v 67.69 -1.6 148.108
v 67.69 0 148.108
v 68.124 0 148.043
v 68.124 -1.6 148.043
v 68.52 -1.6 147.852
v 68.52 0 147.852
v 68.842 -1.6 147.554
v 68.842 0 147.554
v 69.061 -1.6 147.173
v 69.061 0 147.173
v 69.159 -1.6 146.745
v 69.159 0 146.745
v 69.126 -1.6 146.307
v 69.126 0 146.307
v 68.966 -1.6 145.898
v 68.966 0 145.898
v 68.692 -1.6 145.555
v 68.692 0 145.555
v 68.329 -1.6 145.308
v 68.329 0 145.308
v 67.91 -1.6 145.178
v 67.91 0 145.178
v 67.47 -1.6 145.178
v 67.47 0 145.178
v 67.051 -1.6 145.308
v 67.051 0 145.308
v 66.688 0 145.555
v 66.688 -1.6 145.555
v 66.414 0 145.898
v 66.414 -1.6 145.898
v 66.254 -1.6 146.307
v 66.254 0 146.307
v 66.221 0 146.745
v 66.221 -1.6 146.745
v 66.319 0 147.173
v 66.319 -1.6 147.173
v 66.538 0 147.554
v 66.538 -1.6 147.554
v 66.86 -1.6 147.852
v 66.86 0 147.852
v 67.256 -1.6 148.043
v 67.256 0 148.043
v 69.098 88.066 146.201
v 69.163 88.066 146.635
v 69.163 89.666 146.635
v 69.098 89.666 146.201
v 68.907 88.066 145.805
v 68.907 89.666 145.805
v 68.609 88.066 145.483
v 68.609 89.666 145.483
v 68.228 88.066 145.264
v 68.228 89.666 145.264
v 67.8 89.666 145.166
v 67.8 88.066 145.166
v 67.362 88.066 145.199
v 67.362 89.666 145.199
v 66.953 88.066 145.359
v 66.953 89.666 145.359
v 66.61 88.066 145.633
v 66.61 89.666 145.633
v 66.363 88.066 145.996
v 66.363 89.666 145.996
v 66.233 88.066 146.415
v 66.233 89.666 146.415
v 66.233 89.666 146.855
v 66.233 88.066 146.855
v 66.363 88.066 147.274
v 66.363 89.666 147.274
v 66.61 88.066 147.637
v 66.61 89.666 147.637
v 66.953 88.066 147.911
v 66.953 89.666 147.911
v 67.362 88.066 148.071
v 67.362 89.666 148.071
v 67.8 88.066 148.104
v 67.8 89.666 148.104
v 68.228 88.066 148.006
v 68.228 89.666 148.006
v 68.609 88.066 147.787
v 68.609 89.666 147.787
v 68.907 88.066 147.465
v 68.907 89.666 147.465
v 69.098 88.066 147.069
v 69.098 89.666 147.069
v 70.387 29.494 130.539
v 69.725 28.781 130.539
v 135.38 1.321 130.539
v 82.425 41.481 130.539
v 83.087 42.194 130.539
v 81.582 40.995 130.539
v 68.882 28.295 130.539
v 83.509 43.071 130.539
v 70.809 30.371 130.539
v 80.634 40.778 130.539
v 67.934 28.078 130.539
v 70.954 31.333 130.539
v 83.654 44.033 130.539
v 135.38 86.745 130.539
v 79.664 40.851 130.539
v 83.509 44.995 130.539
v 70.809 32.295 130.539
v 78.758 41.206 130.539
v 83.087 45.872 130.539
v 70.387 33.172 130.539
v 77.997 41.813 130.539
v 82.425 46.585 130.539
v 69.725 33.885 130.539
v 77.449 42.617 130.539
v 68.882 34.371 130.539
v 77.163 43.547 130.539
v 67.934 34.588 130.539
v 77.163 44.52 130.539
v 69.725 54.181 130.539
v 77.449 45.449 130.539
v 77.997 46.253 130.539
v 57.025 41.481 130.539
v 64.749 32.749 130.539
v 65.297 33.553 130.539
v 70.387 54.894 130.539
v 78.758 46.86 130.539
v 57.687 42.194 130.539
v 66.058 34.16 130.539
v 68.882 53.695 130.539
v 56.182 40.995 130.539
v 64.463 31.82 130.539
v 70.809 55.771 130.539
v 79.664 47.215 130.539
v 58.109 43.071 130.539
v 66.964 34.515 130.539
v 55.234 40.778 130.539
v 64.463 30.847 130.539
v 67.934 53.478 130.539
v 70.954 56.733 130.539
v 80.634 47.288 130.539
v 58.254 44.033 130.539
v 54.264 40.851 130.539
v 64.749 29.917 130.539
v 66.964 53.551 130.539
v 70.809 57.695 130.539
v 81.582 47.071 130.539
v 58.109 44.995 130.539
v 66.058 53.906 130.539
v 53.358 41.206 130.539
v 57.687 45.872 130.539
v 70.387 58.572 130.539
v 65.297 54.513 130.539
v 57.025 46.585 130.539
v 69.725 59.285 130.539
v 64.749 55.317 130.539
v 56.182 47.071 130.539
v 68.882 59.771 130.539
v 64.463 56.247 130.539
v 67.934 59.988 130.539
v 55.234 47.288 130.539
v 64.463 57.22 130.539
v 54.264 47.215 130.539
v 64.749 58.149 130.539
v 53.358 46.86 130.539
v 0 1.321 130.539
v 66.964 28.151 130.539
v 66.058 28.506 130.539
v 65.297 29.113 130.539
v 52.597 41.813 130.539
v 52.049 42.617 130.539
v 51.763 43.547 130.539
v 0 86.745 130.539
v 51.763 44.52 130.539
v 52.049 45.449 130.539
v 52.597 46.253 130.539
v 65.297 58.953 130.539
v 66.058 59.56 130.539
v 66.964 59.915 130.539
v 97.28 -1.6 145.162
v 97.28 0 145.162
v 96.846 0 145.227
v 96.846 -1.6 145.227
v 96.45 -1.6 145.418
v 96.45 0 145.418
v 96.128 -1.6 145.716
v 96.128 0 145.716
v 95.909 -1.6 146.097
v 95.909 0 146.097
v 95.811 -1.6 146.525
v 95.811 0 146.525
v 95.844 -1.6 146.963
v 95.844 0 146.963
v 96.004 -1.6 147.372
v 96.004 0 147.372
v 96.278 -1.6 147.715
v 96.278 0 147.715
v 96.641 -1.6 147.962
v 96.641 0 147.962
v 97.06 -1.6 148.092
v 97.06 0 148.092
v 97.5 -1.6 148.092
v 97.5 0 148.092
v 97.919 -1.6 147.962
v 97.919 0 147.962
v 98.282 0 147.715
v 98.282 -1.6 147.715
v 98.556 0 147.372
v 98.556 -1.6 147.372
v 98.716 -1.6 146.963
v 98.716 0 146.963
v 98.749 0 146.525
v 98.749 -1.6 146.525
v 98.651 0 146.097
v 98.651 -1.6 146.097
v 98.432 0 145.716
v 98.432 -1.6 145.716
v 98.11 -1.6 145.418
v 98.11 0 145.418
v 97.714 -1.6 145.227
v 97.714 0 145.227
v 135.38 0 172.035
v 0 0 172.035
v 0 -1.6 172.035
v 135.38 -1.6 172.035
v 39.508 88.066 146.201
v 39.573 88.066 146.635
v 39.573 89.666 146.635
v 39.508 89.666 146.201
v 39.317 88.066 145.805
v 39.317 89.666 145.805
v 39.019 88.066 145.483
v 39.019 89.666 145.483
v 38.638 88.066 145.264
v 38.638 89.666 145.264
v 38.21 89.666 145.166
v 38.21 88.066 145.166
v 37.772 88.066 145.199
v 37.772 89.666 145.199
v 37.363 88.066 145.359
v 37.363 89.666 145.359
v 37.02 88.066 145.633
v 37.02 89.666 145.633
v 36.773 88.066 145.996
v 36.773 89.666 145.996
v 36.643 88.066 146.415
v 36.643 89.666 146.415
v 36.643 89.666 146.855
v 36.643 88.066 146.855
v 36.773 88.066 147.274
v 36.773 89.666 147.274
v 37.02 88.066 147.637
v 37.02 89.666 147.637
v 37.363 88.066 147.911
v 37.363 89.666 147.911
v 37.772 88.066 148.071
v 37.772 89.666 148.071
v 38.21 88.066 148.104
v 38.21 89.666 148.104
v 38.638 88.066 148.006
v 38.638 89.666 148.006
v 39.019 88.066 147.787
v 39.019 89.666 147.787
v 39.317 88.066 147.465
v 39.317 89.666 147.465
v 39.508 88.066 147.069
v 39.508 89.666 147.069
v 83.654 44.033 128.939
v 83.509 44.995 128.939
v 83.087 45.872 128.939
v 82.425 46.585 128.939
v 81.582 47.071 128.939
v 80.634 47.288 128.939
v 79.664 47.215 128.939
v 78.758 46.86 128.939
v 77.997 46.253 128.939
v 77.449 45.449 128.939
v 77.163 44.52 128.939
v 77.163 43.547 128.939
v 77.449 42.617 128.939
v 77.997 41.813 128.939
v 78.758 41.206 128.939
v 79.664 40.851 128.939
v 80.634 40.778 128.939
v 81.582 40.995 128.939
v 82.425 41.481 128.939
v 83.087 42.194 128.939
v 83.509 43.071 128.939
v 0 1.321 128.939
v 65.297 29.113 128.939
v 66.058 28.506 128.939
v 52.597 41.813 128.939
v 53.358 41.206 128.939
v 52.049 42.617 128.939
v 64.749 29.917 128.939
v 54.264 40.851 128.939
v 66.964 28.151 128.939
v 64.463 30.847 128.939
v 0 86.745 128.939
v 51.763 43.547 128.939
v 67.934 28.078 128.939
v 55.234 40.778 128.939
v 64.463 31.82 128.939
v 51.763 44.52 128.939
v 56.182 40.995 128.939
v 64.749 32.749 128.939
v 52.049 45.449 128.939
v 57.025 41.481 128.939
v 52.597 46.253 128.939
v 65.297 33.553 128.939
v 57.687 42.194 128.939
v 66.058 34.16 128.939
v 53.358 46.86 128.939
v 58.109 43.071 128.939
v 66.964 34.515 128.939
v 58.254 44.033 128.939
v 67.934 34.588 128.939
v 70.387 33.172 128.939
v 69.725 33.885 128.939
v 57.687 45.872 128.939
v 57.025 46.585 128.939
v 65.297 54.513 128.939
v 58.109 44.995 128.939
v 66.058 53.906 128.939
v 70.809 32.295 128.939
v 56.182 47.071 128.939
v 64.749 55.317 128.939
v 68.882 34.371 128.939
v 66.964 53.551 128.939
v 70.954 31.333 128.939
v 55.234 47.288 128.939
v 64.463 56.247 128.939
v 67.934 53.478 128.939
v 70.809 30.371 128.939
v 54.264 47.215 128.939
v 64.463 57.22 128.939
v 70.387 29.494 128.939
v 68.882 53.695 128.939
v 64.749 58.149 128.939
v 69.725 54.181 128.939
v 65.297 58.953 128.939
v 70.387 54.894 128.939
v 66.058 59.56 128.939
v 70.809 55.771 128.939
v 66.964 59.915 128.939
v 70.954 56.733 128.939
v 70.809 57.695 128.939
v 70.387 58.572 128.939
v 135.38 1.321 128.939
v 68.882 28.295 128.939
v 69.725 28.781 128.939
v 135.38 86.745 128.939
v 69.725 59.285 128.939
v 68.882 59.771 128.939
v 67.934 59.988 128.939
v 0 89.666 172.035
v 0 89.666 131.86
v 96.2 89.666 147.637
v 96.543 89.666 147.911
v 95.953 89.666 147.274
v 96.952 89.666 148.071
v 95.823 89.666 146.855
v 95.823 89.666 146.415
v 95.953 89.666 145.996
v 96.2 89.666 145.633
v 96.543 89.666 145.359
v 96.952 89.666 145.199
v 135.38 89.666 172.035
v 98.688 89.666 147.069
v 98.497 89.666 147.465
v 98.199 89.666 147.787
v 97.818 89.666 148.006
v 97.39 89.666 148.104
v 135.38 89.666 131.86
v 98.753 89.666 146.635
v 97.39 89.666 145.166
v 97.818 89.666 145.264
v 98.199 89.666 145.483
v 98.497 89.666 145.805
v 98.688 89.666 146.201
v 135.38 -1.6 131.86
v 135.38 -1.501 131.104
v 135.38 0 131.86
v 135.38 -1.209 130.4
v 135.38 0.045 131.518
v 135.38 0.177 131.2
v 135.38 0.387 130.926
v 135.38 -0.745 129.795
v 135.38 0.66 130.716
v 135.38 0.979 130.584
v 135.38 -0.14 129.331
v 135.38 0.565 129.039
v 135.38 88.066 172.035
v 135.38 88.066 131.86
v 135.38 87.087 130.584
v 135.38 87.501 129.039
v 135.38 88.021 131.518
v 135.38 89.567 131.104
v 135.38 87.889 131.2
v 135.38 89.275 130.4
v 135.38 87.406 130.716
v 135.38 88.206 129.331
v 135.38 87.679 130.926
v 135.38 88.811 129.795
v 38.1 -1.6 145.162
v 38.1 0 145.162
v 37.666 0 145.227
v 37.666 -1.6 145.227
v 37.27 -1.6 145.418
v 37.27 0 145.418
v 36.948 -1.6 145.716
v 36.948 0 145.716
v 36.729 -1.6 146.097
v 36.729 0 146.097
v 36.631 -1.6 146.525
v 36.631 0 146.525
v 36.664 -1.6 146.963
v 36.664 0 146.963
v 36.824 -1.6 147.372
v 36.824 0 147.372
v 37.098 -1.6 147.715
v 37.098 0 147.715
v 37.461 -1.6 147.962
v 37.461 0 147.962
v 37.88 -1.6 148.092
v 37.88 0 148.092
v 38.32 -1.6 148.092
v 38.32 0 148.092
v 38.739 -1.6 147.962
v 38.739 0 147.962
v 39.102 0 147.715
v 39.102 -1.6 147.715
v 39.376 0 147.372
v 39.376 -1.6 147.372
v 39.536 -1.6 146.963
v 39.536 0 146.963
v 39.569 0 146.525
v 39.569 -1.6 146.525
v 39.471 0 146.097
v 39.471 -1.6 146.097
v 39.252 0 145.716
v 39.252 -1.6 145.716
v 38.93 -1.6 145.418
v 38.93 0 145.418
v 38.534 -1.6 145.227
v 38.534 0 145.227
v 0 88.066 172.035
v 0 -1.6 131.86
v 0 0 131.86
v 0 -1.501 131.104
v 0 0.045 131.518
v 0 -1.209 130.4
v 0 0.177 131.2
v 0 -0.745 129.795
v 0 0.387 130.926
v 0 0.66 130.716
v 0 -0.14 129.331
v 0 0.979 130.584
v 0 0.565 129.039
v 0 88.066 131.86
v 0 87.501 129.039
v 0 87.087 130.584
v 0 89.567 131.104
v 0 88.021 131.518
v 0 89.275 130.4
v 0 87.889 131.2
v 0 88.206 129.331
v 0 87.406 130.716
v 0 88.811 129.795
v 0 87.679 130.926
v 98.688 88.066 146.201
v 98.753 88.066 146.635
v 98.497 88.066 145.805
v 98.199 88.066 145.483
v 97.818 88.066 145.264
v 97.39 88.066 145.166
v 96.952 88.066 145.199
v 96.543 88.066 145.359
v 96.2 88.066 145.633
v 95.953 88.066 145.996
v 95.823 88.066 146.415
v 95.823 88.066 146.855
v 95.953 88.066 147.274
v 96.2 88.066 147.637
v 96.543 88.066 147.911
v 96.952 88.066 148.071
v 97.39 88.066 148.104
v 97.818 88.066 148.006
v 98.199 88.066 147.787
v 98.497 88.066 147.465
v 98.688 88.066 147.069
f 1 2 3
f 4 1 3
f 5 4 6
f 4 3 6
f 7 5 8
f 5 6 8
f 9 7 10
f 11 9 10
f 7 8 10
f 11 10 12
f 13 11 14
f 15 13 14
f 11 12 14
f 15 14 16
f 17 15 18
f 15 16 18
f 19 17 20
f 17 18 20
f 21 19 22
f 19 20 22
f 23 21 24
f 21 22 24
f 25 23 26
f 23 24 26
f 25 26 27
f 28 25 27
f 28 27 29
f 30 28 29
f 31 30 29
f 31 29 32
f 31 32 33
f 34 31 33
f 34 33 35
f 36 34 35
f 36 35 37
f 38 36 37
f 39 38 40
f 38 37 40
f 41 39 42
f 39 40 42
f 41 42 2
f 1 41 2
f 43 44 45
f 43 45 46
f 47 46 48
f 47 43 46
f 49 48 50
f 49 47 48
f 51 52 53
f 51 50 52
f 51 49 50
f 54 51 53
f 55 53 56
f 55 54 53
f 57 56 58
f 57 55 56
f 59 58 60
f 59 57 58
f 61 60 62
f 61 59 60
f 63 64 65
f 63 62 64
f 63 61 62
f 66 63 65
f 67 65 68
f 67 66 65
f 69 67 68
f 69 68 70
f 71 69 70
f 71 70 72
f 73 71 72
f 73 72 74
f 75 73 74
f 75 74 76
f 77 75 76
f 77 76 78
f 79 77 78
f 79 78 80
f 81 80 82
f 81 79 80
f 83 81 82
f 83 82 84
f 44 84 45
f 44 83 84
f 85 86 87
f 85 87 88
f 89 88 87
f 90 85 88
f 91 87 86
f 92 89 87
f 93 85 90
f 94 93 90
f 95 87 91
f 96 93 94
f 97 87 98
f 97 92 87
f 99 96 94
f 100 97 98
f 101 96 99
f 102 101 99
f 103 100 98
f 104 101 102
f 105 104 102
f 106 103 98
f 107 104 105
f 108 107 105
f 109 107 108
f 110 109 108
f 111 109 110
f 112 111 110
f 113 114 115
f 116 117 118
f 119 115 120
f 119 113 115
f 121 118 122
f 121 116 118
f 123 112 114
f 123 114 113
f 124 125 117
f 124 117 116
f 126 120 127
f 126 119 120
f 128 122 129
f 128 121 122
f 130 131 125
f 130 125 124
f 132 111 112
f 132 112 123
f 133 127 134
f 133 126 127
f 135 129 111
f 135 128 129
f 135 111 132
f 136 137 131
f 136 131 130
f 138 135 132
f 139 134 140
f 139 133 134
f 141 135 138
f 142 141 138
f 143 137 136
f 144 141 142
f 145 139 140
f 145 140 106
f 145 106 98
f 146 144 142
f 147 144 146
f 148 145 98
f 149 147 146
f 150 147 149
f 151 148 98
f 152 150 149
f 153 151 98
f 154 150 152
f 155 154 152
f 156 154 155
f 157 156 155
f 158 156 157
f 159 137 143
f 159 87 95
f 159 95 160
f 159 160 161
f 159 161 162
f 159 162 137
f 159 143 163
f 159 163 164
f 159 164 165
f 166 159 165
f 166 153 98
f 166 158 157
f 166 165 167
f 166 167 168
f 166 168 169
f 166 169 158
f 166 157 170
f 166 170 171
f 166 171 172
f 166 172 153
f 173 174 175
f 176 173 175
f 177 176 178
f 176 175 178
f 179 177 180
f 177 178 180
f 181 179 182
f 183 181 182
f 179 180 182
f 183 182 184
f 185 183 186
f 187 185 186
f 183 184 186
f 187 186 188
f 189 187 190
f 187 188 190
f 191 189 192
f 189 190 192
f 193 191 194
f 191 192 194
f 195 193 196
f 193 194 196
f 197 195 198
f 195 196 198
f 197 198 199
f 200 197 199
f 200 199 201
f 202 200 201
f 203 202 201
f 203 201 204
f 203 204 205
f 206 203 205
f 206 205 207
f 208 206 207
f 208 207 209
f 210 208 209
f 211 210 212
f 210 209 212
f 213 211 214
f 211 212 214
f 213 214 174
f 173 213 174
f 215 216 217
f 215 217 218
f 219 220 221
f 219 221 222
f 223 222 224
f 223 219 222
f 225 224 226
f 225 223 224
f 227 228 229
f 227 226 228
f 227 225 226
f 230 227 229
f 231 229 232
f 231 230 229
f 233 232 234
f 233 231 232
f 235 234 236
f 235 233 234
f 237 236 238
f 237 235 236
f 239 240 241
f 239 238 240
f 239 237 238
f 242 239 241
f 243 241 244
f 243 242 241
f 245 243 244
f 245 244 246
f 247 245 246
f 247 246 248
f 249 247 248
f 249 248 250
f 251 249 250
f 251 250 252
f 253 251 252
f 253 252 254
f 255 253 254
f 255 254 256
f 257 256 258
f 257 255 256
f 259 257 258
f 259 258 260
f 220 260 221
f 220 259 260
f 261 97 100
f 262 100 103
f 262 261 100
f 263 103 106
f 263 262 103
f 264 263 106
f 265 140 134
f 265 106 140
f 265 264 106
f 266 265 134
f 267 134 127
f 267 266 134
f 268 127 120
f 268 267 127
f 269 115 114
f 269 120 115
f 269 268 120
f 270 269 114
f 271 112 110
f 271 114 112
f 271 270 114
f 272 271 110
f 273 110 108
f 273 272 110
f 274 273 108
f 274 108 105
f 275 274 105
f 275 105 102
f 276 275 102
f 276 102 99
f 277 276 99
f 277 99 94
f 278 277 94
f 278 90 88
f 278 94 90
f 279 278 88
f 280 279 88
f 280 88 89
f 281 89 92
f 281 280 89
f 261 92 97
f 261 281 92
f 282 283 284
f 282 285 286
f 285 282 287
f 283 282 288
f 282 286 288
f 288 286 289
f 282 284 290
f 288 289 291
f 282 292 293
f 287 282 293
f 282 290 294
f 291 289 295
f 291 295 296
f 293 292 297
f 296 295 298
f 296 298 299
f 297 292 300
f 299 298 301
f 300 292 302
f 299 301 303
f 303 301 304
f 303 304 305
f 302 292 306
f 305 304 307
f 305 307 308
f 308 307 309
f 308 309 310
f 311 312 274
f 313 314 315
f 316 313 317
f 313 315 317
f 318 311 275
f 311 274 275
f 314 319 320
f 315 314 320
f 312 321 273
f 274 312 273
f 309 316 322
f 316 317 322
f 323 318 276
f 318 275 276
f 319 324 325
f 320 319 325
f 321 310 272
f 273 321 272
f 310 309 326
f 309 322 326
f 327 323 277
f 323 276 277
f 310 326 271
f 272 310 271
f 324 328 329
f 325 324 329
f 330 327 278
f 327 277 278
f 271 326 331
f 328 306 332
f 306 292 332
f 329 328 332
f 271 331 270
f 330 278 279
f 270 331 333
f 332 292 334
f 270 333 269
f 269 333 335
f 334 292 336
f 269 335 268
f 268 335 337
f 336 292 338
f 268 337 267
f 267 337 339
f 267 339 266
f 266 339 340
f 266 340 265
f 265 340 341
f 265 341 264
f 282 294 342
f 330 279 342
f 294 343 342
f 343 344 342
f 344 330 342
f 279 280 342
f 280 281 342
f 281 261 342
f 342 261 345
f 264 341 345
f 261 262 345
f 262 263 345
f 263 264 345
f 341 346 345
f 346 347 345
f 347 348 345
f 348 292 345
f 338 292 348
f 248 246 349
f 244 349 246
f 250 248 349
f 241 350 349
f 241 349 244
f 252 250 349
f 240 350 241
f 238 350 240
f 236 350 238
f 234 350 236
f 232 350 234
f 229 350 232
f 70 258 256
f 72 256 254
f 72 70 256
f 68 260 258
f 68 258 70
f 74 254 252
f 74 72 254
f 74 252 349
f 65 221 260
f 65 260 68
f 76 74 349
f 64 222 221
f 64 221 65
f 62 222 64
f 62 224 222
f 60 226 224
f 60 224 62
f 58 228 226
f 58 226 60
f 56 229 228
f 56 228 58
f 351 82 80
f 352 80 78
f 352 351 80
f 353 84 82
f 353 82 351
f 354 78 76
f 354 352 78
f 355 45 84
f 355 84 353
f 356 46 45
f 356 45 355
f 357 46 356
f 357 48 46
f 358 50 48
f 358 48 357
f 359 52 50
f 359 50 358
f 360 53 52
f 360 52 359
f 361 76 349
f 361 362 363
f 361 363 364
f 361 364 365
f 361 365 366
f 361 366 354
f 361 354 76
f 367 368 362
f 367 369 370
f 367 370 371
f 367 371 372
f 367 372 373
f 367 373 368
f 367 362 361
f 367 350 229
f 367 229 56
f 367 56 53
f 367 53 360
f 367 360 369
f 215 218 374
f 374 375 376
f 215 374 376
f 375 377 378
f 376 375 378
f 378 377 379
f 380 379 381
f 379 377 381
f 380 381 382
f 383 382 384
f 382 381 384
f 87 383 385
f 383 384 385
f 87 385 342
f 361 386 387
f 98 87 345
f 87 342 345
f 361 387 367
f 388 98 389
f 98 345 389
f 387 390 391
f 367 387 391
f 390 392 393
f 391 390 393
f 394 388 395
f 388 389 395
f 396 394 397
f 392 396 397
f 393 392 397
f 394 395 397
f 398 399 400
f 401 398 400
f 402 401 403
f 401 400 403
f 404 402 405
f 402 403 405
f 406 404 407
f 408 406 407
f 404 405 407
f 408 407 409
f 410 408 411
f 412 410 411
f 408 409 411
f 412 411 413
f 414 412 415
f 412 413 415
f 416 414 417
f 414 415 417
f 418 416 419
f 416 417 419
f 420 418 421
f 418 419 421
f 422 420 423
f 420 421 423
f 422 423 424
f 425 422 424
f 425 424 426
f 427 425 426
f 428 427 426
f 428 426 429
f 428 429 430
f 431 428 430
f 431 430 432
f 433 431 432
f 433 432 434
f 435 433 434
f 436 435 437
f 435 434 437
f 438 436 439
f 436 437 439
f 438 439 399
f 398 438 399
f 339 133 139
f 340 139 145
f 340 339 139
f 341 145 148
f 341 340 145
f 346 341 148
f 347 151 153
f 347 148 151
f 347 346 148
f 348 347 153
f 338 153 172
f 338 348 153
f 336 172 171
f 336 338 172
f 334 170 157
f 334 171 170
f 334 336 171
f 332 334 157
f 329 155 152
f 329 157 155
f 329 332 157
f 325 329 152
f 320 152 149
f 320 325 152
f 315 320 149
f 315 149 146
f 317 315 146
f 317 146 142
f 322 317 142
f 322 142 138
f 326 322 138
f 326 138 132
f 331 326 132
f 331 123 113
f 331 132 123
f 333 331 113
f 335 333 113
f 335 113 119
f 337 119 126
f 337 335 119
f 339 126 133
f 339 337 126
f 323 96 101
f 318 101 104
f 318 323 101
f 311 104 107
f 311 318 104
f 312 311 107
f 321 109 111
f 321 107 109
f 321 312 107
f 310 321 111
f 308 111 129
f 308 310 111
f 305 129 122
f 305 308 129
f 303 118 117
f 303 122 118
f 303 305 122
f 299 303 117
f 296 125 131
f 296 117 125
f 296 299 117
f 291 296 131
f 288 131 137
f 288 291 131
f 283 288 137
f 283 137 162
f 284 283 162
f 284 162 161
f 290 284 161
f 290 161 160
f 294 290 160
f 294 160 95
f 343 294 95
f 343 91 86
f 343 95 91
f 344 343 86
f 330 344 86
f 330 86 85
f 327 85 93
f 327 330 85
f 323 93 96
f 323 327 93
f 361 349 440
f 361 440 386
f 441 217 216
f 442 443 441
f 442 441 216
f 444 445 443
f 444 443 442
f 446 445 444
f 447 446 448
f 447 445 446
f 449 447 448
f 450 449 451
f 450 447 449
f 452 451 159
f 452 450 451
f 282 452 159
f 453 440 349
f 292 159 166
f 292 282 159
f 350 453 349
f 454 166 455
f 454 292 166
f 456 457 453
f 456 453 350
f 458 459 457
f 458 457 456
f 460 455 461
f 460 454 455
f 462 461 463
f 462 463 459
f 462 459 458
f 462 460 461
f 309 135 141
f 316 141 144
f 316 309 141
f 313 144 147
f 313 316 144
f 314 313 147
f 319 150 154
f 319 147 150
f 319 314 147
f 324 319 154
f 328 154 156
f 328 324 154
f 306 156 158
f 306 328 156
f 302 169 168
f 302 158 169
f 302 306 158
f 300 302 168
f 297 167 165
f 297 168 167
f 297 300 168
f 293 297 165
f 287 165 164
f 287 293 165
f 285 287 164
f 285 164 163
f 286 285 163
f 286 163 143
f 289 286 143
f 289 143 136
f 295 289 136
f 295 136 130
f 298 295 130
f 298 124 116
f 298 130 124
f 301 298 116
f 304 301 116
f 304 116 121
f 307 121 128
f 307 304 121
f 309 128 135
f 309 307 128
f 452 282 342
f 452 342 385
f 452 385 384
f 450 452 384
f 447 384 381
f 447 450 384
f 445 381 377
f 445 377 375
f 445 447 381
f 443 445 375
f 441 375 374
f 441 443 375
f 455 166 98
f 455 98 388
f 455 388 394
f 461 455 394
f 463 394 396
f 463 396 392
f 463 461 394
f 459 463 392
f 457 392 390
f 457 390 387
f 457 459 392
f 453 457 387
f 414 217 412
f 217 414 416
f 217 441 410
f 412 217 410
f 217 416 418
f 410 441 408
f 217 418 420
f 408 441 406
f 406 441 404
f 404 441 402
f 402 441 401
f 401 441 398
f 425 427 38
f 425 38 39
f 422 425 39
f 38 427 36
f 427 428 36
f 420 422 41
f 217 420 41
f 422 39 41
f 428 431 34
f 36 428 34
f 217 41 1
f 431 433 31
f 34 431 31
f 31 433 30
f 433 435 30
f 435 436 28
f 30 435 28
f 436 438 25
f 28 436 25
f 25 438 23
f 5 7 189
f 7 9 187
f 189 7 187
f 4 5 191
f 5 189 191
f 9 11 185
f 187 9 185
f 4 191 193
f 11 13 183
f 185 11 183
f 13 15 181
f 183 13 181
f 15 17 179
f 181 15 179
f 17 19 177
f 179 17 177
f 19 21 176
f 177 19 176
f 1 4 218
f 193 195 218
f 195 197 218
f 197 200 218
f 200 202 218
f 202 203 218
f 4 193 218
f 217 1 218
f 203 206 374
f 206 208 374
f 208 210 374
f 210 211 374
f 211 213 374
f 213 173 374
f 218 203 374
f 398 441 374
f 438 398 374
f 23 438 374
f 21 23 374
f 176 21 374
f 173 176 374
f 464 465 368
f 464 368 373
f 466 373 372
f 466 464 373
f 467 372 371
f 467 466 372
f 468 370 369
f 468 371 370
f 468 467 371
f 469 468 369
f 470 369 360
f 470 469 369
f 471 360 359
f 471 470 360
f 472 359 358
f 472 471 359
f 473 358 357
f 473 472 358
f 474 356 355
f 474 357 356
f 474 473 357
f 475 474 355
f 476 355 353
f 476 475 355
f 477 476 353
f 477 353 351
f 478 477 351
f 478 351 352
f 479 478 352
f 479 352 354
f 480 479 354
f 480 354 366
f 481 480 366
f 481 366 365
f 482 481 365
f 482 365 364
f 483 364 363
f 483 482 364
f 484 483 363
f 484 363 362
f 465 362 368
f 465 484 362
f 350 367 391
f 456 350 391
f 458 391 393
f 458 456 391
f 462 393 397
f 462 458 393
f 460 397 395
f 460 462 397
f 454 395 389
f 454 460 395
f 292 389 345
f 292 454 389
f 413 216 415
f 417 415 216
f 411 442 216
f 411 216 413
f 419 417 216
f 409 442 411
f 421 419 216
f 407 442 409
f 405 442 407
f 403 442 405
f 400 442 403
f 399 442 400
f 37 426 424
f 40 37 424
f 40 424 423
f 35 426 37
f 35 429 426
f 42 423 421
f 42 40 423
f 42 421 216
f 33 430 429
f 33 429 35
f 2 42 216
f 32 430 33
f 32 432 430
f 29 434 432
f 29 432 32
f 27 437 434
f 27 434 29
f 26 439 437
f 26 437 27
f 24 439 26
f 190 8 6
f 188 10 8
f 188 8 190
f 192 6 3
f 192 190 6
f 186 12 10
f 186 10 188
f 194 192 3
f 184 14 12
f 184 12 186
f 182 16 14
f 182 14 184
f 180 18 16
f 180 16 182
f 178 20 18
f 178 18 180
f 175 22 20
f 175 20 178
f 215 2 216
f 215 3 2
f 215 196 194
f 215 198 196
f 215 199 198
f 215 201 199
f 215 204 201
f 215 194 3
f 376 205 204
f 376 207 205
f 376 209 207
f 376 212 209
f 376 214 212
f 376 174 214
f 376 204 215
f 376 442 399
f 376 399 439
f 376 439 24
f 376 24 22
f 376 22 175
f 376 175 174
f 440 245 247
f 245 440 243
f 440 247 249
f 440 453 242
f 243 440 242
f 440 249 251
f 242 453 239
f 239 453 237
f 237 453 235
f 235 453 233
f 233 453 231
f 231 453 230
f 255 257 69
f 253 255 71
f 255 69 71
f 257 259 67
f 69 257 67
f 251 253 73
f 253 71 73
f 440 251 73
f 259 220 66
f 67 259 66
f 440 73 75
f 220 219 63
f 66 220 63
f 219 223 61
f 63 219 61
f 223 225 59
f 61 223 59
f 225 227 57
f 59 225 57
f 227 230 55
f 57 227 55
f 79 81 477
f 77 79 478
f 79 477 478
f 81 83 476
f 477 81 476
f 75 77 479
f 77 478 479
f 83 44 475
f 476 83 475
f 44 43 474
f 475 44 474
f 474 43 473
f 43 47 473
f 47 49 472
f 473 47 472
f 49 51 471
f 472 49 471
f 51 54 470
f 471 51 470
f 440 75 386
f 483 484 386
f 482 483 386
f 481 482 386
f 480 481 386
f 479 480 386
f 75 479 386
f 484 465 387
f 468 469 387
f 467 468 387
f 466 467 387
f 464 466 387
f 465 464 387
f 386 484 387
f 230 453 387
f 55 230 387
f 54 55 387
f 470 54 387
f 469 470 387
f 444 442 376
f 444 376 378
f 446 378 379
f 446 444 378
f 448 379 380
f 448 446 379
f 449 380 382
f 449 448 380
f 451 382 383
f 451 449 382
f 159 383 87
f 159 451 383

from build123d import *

# Parameters (mm, degrees)
SKETCH1_W                  = 135.38
SKETCH1_H                  = 172.035
SKETCH1_R                  = 3.2639
SKETCH1_R_2                = 1.4732
BASE_FLANGE1_DEPTH         = 1.6002
SKETCHED_BEND1_OUTLINE_W   = 135.38
SKETCHED_BEND1_OUTLINE_H   = 1.6002
SKETCHED_BEND1_DEPTH       = 129.239310973
SKETCHED_START             = 148.1082001
SKETCHED_BEND1_2_OUTLINE_W = 135.38
SKETCHED_BEND1_2_OUTLINE_H = 1.6002
SKETCHED_BEND1_2_DEPTH     = 23.9267999
SKETCHED_START_2           = 131.860207433
SKETCHED_BEND1_3_OUTLINE_W = 135.38
SKETCHED_BEND1_3_OUTLINE_H = 1.6002
SKETCHED_BEND1_3_DEPTH     = 13.301592467
SKETCHED_START_3           = 130.391703893
SKETCHED_BEND1_4_OUTLINE_W = 135.38
SKETCHED_BEND1_4_OUTLINE_H = 88.066185133
SKETCHED_BEND1_4_OUTLINE_R = 3.2639
SKETCHED_BEND1_4_DEPTH     = 0.14770354
SKETCHED_START_4           = 128.939207433
SKETCHED_BEND1_5_OUTLINE_W = 135.38
SKETCHED_BEND1_5_OUTLINE_H = 88.066185133
SKETCHED_BEND1_5_OUTLINE_R = 3.2639
SKETCHED_BEND1_5_DEPTH     = 2.921
SKETCHED_START_5           = 129.239310973
SKETCHED_BEND1_6_OUTLINE_W = 135.38
SKETCHED_BEND1_6_OUTLINE_H = 1.6002
SKETCHED_BEND1_6_DEPTH     = 18.868889127
SKETCHED_BEND1_7_DEPTH     = 135.38
SKETCHED_START_6           = 87
SKETCHED_BEND1_8_OUTLINE_R = 1.4732
SKETCHED_BEND1_8_DEPTH     = 4


with BuildPart() as part:
    # Base-Flange1: sheet metal written as solids
    # Sketch1 → Base-Flange1 (new body)
    with BuildSketch(Plane(origin=(0, 0, 0), x_dir=(1, 0, 0), z_dir=(0, 1, 0))):
        with Locations((67.69, -86.0175)):
            Rectangle(SKETCH1_W, SKETCH1_H)
        with Locations(Location((67.69, -73.3175, 0), (0, 0, 270))):
            Circle(SKETCH1_R, mode=Mode.SUBTRACT)
        with Locations(Location((67.69, -98.7175, 0), (0, 0, 270))):
            Circle(SKETCH1_R, mode=Mode.SUBTRACT)
        with Locations(Location((54.99, -86.0175, 0), (0, 0, 270))):
            Circle(SKETCH1_R, mode=Mode.SUBTRACT)
        with Locations(Location((80.39, -86.0175, 0), (0, 0, 270))):
            Circle(SKETCH1_R, mode=Mode.SUBTRACT)
        with Locations(Location((38.1, -25.4, 0), (0, 0, 270))):
            Circle(SKETCH1_R_2, mode=Mode.SUBTRACT)
        with Locations(Location((97.28, -25.4, 0), (0, 0, 270))):
            Circle(SKETCH1_R_2, mode=Mode.SUBTRACT)
        with Locations(Location((97.28, -146.635, 0), (0, 0, 90))):
            Circle(SKETCH1_R_2, mode=Mode.SUBTRACT)
        with Locations(Location((38.1, -146.635, 0), (0, 0, 90))):
            Circle(SKETCH1_R_2, mode=Mode.SUBTRACT)
        with Locations(Location((67.69, -25.4, 0), (0, 0, 270))):
            Circle(SKETCH1_R_2, mode=Mode.SUBTRACT)
        with Locations(Location((67.69, -146.635, 0), (0, 0, 270))):
            Circle(SKETCH1_R_2, mode=Mode.SUBTRACT)
    extrude(amount=-BASE_FLANGE1_DEPTH)

    # Sketched Bend1: read off the stored shape, not the designer's step
    # Sketched Bend1 outline → Sketched Bend1 (cut)
    with BuildSketch(Plane.XY):
        with Locations((67.69, -0.8001)):
            Rectangle(SKETCHED_BEND1_OUTLINE_W, SKETCHED_BEND1_OUTLINE_H)
    extrude(amount=SKETCHED_BEND1_DEPTH, mode=Mode.SUBTRACT)

    # Sketched Bend1 4 outline → Sketched Bend1 4 (add)
    with BuildSketch(Plane.XY.offset(SKETCHED_START_3)):
        with Locations((67.69, 44.033092567)):
            Rectangle(SKETCHED_BEND1_4_OUTLINE_W, SKETCHED_BEND1_4_OUTLINE_H)
        with Locations((67.69, 31.333092567)):
            Circle(SKETCHED_BEND1_4_OUTLINE_R, mode=Mode.SUBTRACT)
        with Locations((54.99, 44.033092567)):
            Circle(SKETCHED_BEND1_4_OUTLINE_R, mode=Mode.SUBTRACT)
        with Locations((80.39, 44.033092567)):
            Circle(SKETCHED_BEND1_4_OUTLINE_R, mode=Mode.SUBTRACT)
        with Locations((67.69, 56.733092567)):
            Circle(SKETCHED_BEND1_4_OUTLINE_R, mode=Mode.SUBTRACT)
    extrude(amount=SKETCHED_BEND1_4_DEPTH)



with BuildPart() as body_2:
    # Sketched Bend1 2 outline → Sketched Bend1 2 (new body)
    with BuildSketch(Plane.XY.offset(SKETCHED_START)):
        with Locations((67.69, 88.866285133)):
            Rectangle(SKETCHED_BEND1_2_OUTLINE_W, SKETCHED_BEND1_2_OUTLINE_H)
    extrude(amount=SKETCHED_BEND1_2_DEPTH)


with BuildPart() as body_3:
    # Sketched Bend1 3 outline → Sketched Bend1 3 (new body)
    with BuildSketch(Plane.XY.offset(SKETCHED_START_2)):
        with Locations((67.69, 88.866285133)):
            Rectangle(SKETCHED_BEND1_3_OUTLINE_W, SKETCHED_BEND1_3_OUTLINE_H)
    extrude(amount=SKETCHED_BEND1_3_DEPTH)


with BuildPart() as part_1:
    add(part.part)

    add(body_3.part)  # Sketched Bend1 5 merges body 3
    # Sketched Bend1 5 outline → Sketched Bend1 5 (add)
    with BuildSketch(Plane.XY.offset(SKETCHED_START_4)):
        with Locations((67.69, 44.033092567)):
            Rectangle(SKETCHED_BEND1_5_OUTLINE_W, SKETCHED_BEND1_5_OUTLINE_H)
        with Locations((67.69, 31.333092567)):
            Circle(SKETCHED_BEND1_5_OUTLINE_R, mode=Mode.SUBTRACT)
        with Locations((54.99, 44.033092567)):
            Circle(SKETCHED_BEND1_5_OUTLINE_R, mode=Mode.SUBTRACT)
        with Locations((80.39, 44.033092567)):
            Circle(SKETCHED_BEND1_5_OUTLINE_R, mode=Mode.SUBTRACT)
        with Locations((67.69, 56.733092567)):
            Circle(SKETCHED_BEND1_5_OUTLINE_R, mode=Mode.SUBTRACT)
    extrude(amount=SKETCHED_BEND1_5_DEPTH)


    add(body_2.part)  # Sketched Bend1 6 merges body 2
    # Sketched Bend1 6 outline → Sketched Bend1 6 (add)
    with BuildSketch(Plane.XY.offset(SKETCHED_START_5)):
        with Locations((67.69, 88.866285133)):
            Rectangle(SKETCHED_BEND1_6_OUTLINE_W, SKETCHED_BEND1_6_OUTLINE_H)
    extrude(amount=SKETCHED_BEND1_6_DEPTH)

    # Sketched Bend1 7 outline → Sketched Bend1 7 (cut)
    with BuildSketch(Plane.YZ):
        with BuildLine():
            Line((1.3208, 130.539407433), (86.745385133, 130.539407433))
            ThreePointArc((86.745385133, 130.539407433), (87.67933177, 130.926260797), (88.066185133, 131.860207433))
            Line((88.066185133, 131.860207433), (0, 131.860207433))
            ThreePointArc((0, 131.860207433), (0.386853363, 130.926260797), (1.3208, 130.539407433))
        make_face()
        with BuildLine():
            Line((0, 128.939207433), (1.3208, 128.939207433))
            ThreePointArc((1.3208, 128.939207433), (-0.744658907, 129.794748526), (-1.6002, 131.860207433))
            Line((-1.6002, 131.860207433), (-1.6002, 129.239310973))
            Line((-1.6002, 129.239310973), (0, 129.239310973))
            Line((0, 129.239310973), (0, 128.939207433))
        make_face()
        with BuildLine():
            ThreePointArc((89.666385133, 131.860207433), (88.810844041, 129.794748526), (86.745385133, 128.939207433))
            Line((86.745385133, 128.939207433), (88.066185133, 128.939207433))
            Line((88.066185133, 128.939207433), (88.066185133, 129.239310973))
            Line((88.066185133, 129.239310973), (89.666385133, 129.239310973))
            Line((89.666385133, 129.239310973), (89.666385133, 131.860207433))
        make_face()
    extrude(amount=SKETCHED_BEND1_7_DEPTH, mode=Mode.SUBTRACT)

    # Sketched Bend1 8 outline → Sketched Bend1 8 (cut)
    with BuildSketch(Plane(origin=(0, 0, 0), x_dir=(1, 0, 0), z_dir=(0, 1, 0)).offset(SKETCHED_START_6)):
        with Locations((67.69, -146.635)):
            Circle(SKETCHED_BEND1_8_OUTLINE_R)
        with Locations((97.28, -146.635)):
            Circle(SKETCHED_BEND1_8_OUTLINE_R)
        with Locations((38.1, -146.635)):
            Circle(SKETCHED_BEND1_8_OUTLINE_R)
    extrude(amount=SKETCHED_BEND1_8_DEPTH, mode=Mode.SUBTRACT)


solid = part_1.part
